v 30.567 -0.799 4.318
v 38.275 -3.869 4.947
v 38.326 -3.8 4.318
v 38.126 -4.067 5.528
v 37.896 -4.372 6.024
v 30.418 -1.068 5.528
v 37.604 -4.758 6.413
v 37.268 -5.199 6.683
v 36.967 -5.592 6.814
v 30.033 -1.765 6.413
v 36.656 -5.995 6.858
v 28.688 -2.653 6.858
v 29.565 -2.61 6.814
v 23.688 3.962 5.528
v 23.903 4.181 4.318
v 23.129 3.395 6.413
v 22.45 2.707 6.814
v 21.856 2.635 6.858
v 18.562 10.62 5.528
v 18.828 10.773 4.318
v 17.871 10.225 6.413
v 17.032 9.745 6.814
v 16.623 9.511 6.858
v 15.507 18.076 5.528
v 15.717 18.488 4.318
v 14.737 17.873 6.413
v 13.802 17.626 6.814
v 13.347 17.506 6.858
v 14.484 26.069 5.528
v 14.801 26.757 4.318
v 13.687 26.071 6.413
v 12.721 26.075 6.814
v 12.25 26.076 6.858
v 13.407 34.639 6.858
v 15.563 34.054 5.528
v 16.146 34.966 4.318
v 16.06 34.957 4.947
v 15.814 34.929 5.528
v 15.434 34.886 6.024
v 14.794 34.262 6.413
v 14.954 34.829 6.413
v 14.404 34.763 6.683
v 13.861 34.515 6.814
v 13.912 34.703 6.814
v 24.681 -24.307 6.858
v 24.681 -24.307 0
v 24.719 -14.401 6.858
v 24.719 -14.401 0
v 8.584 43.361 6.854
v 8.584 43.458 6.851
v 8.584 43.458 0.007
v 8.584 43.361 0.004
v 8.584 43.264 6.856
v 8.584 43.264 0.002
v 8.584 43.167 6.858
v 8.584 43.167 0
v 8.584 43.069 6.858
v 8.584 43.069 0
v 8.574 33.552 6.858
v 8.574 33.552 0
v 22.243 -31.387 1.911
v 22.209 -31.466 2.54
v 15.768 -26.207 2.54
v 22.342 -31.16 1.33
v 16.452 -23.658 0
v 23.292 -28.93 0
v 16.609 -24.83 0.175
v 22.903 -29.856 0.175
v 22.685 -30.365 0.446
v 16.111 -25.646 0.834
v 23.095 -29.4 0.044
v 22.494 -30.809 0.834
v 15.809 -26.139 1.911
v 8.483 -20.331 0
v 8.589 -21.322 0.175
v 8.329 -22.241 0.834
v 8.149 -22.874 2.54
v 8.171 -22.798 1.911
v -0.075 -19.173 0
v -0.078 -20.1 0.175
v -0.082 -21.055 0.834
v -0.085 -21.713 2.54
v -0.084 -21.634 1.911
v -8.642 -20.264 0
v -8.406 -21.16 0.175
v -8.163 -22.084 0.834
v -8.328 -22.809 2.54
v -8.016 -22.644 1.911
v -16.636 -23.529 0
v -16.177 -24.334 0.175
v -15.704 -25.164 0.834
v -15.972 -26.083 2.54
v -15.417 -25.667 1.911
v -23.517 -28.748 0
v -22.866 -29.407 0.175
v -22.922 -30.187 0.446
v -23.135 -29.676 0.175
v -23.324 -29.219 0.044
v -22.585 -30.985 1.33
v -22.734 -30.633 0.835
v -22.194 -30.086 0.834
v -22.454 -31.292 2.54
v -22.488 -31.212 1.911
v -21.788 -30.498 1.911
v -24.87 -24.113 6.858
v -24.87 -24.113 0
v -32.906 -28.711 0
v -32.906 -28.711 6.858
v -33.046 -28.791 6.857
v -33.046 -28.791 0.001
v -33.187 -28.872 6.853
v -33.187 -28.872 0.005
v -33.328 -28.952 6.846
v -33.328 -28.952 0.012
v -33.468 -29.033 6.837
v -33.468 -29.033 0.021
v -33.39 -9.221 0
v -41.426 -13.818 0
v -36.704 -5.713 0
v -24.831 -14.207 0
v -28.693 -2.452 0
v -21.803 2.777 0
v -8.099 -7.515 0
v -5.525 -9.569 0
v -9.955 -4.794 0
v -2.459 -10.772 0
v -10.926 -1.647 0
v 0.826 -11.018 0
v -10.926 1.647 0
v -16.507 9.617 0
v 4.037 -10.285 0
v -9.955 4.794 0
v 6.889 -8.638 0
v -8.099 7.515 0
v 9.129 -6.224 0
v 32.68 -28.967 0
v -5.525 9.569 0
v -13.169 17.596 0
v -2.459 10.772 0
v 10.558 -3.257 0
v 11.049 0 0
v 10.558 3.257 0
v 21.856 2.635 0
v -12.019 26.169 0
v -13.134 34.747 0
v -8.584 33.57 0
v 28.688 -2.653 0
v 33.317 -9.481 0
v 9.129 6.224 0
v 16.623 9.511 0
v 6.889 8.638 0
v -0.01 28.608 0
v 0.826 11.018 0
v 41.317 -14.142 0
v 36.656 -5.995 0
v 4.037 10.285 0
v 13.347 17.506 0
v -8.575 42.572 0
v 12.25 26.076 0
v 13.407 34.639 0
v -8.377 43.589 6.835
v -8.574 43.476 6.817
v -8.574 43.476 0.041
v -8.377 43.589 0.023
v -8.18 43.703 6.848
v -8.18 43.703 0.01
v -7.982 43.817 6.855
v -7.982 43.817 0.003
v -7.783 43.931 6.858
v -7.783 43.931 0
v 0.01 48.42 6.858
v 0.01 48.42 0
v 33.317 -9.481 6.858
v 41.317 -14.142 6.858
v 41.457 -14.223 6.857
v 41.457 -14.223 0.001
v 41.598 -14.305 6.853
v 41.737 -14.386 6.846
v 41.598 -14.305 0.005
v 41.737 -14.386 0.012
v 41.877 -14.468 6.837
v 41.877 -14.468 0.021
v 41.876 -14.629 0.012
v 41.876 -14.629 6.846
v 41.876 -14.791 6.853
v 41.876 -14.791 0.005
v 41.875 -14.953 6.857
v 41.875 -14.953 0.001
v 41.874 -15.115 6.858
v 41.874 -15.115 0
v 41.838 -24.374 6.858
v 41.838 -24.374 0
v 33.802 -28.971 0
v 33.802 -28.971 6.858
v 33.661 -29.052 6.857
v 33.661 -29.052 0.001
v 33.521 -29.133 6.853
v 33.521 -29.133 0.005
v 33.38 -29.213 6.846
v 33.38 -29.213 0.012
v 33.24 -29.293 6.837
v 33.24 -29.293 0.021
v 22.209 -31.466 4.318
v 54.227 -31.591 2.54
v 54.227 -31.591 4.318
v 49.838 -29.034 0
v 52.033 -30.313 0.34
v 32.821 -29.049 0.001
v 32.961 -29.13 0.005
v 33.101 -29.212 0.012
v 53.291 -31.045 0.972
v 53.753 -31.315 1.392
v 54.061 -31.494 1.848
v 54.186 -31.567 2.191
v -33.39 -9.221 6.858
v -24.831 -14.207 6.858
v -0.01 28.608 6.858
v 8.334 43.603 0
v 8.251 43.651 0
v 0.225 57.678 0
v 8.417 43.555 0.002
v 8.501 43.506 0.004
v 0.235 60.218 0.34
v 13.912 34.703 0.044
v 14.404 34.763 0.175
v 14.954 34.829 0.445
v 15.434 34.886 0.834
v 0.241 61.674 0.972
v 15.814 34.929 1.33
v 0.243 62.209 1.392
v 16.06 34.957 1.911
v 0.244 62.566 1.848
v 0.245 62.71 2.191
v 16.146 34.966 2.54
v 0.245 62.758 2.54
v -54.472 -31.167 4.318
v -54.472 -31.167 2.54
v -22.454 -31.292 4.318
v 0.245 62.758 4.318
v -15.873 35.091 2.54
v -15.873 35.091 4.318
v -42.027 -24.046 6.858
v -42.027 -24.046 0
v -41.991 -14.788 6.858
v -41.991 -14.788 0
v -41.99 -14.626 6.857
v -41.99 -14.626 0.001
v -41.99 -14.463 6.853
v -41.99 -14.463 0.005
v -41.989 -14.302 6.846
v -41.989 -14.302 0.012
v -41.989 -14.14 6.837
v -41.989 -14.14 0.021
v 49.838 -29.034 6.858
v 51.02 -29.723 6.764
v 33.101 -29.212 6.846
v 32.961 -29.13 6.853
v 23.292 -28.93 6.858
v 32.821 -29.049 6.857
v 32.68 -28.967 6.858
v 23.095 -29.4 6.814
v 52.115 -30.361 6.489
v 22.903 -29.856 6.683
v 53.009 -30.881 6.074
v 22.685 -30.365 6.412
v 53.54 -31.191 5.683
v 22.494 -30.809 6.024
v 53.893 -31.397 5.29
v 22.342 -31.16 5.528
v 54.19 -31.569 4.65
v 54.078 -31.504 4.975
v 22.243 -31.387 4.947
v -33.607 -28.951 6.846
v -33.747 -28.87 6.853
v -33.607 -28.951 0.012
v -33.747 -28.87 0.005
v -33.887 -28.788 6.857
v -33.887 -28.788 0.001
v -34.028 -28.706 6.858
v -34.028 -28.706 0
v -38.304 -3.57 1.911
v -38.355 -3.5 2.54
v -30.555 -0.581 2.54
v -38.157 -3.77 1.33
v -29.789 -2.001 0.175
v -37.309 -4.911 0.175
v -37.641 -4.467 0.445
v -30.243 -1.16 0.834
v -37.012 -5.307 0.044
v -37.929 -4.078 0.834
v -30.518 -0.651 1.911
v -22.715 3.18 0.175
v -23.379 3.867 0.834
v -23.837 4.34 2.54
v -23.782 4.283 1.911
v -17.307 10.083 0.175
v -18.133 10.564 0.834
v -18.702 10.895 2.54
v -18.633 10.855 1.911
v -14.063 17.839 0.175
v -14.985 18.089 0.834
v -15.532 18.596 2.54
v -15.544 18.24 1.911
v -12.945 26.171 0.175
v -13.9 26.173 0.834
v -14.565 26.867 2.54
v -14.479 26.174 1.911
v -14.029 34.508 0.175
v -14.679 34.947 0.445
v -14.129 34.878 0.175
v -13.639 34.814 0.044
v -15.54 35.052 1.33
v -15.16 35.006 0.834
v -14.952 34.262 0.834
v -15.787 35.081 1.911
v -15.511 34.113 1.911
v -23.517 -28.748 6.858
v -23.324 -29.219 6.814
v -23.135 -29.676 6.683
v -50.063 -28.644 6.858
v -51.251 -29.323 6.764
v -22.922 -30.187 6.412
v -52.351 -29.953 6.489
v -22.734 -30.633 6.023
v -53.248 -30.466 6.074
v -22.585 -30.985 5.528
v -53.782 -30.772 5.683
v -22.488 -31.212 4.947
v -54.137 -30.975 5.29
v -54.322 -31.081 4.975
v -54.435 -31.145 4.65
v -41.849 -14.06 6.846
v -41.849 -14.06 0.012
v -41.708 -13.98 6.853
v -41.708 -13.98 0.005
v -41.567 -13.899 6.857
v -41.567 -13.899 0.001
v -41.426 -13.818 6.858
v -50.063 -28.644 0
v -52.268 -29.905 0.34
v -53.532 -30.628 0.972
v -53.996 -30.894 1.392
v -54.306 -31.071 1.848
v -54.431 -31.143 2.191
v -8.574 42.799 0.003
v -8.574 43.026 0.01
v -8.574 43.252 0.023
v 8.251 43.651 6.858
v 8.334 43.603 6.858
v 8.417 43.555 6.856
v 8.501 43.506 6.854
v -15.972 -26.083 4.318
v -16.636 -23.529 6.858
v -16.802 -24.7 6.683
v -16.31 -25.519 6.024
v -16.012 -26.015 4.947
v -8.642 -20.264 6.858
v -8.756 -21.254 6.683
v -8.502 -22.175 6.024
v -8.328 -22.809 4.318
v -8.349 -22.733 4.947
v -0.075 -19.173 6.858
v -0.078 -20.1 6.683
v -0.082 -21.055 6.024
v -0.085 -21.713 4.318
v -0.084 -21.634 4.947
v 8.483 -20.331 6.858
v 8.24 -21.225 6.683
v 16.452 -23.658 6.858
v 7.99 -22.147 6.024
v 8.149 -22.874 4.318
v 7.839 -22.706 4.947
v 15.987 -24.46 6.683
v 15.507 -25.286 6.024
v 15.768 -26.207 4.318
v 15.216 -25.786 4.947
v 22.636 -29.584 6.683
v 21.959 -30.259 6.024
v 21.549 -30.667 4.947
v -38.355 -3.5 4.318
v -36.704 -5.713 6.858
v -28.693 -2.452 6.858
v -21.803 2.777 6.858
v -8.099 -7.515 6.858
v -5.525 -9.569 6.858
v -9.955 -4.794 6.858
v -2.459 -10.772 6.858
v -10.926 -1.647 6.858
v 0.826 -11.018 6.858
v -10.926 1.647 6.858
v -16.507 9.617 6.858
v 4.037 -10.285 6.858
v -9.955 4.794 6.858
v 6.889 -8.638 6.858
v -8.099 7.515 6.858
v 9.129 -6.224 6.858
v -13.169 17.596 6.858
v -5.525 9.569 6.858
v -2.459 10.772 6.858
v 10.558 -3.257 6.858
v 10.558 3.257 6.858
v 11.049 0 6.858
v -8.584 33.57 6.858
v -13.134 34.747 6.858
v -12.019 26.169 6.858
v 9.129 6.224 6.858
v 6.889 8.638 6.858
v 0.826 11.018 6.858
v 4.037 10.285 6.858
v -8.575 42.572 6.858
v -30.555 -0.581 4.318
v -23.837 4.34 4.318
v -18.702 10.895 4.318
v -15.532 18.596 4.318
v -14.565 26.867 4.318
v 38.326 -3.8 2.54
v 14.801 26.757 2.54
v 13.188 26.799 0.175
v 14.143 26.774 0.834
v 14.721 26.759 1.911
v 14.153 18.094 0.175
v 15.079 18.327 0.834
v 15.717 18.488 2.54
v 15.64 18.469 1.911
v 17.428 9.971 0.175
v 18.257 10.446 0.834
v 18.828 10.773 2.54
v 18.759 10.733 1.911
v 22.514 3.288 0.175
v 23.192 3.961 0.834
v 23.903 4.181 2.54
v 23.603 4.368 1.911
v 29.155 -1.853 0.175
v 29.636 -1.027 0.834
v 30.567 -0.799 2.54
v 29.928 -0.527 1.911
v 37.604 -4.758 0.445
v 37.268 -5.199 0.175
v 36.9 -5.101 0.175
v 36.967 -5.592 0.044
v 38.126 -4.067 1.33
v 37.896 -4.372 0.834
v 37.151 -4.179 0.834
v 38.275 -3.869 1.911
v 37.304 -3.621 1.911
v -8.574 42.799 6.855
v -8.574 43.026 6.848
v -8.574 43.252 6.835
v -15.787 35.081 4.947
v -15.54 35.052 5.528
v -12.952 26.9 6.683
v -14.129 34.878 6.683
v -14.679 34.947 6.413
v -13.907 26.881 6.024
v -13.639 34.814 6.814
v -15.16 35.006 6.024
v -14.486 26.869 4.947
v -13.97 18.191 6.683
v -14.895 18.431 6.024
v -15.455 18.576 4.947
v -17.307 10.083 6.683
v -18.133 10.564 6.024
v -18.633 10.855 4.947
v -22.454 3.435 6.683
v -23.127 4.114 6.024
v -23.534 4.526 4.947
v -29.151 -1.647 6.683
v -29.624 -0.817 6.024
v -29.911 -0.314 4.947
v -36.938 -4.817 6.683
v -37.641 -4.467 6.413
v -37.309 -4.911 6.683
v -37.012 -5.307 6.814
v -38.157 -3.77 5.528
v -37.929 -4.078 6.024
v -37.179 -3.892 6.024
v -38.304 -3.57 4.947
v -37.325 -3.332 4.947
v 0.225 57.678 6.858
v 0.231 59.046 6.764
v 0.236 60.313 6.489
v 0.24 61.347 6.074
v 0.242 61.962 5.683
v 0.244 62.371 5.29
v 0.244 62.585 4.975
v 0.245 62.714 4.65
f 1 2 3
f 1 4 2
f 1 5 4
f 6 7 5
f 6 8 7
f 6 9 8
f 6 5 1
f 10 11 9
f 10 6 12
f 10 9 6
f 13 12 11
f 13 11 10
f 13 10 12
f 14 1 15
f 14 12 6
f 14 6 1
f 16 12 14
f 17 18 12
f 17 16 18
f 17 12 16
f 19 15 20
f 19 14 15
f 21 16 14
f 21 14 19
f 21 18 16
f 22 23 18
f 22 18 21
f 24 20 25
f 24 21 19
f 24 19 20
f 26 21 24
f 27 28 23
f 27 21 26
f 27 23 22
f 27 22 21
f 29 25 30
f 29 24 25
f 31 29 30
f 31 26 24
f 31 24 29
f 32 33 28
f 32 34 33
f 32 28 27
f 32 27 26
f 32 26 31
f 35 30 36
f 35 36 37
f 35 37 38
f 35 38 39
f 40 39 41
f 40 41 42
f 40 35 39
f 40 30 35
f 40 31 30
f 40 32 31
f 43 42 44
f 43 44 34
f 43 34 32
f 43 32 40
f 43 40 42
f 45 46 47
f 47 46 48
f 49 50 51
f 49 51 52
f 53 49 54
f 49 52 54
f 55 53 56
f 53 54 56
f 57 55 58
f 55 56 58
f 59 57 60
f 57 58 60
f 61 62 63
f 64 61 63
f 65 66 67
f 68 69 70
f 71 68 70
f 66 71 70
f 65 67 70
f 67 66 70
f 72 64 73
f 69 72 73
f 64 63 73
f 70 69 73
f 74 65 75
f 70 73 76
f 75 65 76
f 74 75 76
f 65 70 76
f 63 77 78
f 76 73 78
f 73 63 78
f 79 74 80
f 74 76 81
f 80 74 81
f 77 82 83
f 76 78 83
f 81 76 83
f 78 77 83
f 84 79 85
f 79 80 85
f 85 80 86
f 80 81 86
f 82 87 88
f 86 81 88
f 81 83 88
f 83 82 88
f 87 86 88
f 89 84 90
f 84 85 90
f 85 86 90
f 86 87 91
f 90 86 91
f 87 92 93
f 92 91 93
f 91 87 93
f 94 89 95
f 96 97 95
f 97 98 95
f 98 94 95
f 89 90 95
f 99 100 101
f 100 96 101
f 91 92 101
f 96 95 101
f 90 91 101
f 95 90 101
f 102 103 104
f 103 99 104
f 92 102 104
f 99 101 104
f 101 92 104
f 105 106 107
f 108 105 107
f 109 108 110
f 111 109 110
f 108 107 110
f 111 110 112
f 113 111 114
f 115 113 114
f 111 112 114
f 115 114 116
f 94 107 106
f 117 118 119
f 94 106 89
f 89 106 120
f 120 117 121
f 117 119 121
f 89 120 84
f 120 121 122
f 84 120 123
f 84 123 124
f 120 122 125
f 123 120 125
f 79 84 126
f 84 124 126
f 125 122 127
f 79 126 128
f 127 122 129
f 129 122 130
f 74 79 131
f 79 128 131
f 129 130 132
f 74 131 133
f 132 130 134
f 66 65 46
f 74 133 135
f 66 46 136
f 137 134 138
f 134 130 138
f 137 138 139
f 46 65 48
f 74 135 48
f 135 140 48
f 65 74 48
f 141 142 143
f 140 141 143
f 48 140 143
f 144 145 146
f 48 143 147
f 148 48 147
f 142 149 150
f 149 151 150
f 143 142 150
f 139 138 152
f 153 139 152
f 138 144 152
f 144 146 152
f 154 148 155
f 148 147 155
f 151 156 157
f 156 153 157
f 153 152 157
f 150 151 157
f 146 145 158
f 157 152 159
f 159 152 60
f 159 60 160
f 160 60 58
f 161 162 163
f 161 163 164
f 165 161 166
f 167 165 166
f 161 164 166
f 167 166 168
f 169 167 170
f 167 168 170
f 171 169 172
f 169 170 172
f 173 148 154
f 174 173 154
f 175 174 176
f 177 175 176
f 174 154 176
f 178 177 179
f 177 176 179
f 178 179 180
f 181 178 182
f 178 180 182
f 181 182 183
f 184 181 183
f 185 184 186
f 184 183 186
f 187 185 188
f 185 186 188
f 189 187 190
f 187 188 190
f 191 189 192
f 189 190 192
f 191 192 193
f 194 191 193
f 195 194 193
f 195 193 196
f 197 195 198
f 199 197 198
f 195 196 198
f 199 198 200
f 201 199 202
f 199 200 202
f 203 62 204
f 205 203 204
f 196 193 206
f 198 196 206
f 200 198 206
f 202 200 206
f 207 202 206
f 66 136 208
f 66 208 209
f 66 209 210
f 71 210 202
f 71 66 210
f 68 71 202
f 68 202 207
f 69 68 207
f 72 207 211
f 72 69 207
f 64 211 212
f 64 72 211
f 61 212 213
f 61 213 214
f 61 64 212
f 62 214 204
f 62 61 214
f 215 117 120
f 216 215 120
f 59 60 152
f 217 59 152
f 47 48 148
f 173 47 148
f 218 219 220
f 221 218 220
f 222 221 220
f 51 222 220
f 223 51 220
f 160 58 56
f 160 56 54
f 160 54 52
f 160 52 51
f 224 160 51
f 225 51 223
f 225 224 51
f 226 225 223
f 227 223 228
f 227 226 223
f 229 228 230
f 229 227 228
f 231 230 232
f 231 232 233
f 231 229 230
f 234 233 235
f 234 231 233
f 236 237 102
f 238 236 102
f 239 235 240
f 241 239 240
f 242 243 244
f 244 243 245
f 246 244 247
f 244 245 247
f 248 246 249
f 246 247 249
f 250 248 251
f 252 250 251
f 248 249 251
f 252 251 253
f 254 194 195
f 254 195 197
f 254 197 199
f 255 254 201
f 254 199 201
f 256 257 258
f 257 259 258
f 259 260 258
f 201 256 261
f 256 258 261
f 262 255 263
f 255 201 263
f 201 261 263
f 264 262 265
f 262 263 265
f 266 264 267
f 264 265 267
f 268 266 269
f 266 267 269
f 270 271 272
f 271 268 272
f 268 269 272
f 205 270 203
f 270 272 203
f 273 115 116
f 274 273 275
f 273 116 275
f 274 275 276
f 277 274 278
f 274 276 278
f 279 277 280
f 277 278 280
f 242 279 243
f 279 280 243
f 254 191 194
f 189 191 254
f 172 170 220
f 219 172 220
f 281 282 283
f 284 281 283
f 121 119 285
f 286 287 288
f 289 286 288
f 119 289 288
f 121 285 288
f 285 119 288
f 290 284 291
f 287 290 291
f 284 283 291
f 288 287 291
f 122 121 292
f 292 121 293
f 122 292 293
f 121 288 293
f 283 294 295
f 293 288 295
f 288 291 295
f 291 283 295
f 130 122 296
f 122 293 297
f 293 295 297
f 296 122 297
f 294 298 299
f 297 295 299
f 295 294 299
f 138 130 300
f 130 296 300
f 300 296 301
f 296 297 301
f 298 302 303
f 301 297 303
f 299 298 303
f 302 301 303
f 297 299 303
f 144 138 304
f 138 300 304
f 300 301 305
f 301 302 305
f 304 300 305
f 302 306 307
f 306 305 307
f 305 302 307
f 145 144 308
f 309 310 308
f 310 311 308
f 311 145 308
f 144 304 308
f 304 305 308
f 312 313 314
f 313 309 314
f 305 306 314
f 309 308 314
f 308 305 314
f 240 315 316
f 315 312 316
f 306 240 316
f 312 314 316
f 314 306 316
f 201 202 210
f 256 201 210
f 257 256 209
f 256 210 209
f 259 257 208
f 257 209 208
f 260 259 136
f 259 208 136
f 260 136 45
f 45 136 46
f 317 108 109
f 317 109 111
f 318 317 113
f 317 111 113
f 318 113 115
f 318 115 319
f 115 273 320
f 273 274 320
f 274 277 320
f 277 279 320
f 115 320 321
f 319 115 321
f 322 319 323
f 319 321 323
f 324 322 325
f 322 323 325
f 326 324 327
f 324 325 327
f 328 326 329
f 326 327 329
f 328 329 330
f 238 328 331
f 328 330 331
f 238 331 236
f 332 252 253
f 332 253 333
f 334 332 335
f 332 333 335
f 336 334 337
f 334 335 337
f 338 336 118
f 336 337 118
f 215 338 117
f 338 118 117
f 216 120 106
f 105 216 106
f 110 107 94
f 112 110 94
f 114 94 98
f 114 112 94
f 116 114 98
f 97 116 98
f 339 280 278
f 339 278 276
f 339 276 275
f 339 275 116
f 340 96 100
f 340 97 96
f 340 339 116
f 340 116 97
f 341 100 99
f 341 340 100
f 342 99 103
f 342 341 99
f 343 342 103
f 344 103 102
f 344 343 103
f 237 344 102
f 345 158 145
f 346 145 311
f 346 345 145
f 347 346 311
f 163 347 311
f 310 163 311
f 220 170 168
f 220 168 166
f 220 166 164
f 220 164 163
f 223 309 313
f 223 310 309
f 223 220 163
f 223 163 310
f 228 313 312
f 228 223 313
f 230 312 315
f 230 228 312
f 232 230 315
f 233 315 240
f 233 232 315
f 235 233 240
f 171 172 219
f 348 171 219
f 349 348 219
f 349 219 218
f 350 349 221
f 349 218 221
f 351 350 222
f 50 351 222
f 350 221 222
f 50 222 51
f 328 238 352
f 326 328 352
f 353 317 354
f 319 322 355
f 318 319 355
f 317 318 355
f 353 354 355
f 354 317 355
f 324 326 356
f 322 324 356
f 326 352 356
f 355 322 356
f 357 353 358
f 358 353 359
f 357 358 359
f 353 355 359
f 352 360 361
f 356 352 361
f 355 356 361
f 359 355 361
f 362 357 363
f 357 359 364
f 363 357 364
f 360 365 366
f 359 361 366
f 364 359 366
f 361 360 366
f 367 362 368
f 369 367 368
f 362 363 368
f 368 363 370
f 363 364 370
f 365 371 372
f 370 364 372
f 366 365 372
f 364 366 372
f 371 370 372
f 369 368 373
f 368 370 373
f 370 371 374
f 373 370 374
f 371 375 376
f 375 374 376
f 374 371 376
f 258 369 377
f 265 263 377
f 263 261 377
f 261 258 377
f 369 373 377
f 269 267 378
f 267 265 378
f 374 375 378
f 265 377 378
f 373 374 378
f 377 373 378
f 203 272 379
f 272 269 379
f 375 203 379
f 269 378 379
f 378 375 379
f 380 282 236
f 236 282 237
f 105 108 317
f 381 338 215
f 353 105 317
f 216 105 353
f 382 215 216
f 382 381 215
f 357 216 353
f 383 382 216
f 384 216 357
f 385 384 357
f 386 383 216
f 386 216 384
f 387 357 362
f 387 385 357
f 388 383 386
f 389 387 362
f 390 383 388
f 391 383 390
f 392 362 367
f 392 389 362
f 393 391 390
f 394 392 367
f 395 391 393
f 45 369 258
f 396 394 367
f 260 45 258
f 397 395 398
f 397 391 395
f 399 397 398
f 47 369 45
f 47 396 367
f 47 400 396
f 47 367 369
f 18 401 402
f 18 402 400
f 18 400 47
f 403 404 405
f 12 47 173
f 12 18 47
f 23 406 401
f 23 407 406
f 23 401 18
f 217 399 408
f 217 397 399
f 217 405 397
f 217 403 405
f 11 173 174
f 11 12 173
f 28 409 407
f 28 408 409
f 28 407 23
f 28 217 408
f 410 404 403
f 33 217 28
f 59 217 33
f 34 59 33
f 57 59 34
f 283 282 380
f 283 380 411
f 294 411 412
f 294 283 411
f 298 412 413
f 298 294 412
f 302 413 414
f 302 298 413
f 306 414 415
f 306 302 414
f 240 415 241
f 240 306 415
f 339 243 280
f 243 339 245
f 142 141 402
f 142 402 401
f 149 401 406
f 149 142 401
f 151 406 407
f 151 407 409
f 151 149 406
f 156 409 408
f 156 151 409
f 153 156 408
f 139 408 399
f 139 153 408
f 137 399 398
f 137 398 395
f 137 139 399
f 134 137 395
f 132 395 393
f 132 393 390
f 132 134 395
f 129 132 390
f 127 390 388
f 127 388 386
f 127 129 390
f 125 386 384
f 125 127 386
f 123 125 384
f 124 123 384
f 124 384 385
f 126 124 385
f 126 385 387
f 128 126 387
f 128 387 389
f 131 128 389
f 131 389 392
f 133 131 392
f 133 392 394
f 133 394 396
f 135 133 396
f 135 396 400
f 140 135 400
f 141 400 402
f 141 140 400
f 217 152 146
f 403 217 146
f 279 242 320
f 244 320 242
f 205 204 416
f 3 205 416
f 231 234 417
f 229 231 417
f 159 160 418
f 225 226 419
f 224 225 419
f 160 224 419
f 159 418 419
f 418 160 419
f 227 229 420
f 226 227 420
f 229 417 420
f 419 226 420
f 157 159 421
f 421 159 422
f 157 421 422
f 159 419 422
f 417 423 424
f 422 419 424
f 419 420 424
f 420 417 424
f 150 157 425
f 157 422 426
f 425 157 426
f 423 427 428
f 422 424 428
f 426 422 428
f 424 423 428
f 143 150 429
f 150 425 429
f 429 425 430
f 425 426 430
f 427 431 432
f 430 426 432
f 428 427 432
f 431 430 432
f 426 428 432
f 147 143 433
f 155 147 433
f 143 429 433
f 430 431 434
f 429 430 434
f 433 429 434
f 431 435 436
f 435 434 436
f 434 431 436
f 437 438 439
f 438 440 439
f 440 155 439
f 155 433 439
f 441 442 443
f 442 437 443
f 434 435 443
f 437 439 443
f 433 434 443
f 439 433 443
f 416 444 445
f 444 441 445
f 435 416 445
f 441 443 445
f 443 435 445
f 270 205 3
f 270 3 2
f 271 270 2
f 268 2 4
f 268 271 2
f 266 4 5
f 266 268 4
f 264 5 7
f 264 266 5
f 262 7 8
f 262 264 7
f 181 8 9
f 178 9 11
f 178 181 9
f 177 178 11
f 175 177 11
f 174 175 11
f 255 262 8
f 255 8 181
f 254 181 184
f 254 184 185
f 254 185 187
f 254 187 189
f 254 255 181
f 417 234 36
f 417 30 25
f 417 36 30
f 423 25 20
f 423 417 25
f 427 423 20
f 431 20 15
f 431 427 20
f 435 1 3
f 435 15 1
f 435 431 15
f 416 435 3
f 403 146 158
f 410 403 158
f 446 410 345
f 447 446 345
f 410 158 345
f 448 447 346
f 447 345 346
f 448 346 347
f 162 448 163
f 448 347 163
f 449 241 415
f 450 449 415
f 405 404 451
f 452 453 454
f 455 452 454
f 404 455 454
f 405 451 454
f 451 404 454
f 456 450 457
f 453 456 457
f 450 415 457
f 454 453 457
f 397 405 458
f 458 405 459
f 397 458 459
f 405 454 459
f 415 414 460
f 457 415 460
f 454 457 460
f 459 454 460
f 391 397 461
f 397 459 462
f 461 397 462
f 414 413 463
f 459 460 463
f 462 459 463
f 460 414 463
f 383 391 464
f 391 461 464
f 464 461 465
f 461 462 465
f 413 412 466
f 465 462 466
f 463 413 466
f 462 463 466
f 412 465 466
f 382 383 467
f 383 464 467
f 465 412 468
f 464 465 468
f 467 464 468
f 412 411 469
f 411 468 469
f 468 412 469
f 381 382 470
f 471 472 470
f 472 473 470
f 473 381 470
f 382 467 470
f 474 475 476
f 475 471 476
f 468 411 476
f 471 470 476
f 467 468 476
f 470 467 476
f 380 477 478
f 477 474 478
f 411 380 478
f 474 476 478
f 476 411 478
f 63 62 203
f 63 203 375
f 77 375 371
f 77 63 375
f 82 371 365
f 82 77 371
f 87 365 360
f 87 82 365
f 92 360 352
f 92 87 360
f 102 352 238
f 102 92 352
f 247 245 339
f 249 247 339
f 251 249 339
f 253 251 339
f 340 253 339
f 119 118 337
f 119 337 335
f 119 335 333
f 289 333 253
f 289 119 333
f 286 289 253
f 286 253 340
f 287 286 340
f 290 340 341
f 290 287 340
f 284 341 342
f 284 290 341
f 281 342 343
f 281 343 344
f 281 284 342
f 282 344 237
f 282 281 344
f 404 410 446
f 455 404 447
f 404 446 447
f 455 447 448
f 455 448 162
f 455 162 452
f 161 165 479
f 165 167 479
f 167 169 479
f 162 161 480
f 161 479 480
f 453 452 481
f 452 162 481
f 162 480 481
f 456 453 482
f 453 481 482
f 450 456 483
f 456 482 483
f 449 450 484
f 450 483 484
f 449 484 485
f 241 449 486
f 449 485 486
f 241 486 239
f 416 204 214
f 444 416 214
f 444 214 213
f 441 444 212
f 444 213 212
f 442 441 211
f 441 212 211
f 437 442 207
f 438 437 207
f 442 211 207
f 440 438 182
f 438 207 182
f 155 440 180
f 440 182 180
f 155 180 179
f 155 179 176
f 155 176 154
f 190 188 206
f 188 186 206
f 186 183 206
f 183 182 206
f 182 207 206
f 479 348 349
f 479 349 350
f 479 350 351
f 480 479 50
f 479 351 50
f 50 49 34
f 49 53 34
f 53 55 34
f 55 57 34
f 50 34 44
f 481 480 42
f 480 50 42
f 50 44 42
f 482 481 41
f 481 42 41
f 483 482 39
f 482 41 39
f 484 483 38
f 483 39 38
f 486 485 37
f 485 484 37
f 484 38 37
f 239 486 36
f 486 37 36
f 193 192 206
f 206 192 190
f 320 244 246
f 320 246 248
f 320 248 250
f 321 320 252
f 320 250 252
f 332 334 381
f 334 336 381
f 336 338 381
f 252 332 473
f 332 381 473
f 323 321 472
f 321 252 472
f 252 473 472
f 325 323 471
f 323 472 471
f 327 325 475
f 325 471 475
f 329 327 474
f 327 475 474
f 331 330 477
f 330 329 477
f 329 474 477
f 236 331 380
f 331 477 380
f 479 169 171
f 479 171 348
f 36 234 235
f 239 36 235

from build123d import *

# Parameters (mm, degrees)
F0_R         = 11.049
F1_DEPTH     = 6.858
F2_DEPTH     = 46.99
F3_DEPTH     = 37.592
F4_DEPTH     = 42.418
F5_DEPTH     = 29.718
F6_DEPTH     = 25.4
F7_T1_DEPTH  = 44.7190403061
F7_T3_DEPTH  = 44.7190403061
F7_T5_DEPTH  = 44.7190403061
F7_T7_DEPTH  = 44.7190403061
F7_T9_DEPTH  = 44.7190403061
F7_T11_DEPTH = 44.7190403061
F7_T14_ANGLE = 117.6067451319
F7_T16_ANGLE = 117.3898443425
F7_T18_ANGLE = 118.1021999746
F7_T20_ANGLE = 118.1021999746
F7_T22_ANGLE = 117.3898443425
F7_T24_ANGLE = 117.6067451319


# Not quite as in the source:
# - a fillet or chamfer that OpenCascade refuses, or shapes differently, is made with other operations: its cross-section is extruded or revolved along the edge and cut away or added


with BuildPart() as f1:
    # F0 (on Top) → F1 (new body)
    with BuildSketch(Plane.XY):
        with BuildLine():
            Line((22.208523276, -31.466120161), (54.2273194105, -31.5911650137))
            Line((54.2273194105, -31.5911650137), (38.3262133623, -3.7995517362))
            ThreePointArc((38.3262133623, -3.7995517362), (18.8280371905, 10.7725526064), (16.14619778, 34.966205418))
            Line((16.14619778, 34.966205418), (0.2450917317, 62.7578186955))
            Line((0.2450917317, 62.7578186955), (-15.8725983546, 35.0912502707))
            ThreePointArc((-15.8725983546, 35.0912502707), (-18.7017871859, 10.8950848293), (-38.354721056, -3.500085257))
            Line((-38.354721056, -3.500085257), (-54.4724111423, -31.1666536818))
            Line((-54.4724111423, -31.1666536818), (-22.4536150077, -31.2916985345))
            ThreePointArc((-22.4536150077, -31.2916985345), (-0.0847964289, -21.7128455258), (22.208523276, -31.466120161))
        make_face()
        Polygon((-41.9885712831, -14.1401743102), (-33.3904459647, -9.2207152943), (-24.8310068248, -14.207180737), (-24.8696930034, -24.1131051956), (-33.4678183218, -29.0325642115), (-42.0272574616, -24.0460987688), align=None, mode=Mode.SUBTRACT)
        Polygon((24.6805966683, -24.3066168019), (24.7192828468, -14.4006923433), (33.3174081652, -9.4812333274), (41.8768473051, -14.4676987701), (41.8381611265, -24.3736232287), (33.2400358081, -29.2930822446), align=None, mode=Mode.SUBTRACT)
        Circle(F0_R, mode=Mode.SUBTRACT)
        Polygon((-8.5839493951, 33.5699382512), (-8.5737367865, 43.4759329869), (0.0102126086, 48.4200859762), (8.5839493951, 43.4582442299), (8.5737367865, 33.5522494943), (-0.0102126086, 28.6080965049), align=None, mode=Mode.SUBTRACT)
        with BuildLine():
            Line((-22.4536150077, -31.2916985345), (22.208523276, -31.466120161))
            ThreePointArc((22.208523276, -31.466120161), (-0.0847964289, -21.7128455258), (-22.4536150077, -31.2916985345))
        make_face()
        with BuildLine():
            ThreePointArc((16.14619778, 34.966205418), (18.8280371905, 10.7725526064), (38.3262133623, -3.7995517362))
            Line((38.3262133623, -3.7995517362), (16.14619778, 34.966205418))
        make_face()
        with BuildLine():
            Line((-15.8725983546, 35.0912502707), (-38.354721056, -3.500085257))
            ThreePointArc((-38.354721056, -3.500085257), (-18.7017871859, 10.8950848293), (-15.8725983546, 35.0912502707))
        make_face()
    extrude(amount=F1_DEPTH)

    # F0 (on Top) → F2 (cut)
    with BuildSketch(Plane.XY):
        with BuildLine():
            Line((-15.8725983546, 35.0912502707), (-38.354721056, -3.500085257))
            ThreePointArc((-38.354721056, -3.500085257), (-18.7017871859, 10.8950848293), (-15.8725983546, 35.0912502707))
        make_face()
    extrude(amount=F2_DEPTH, mode=Mode.SUBTRACT)

    # F0 (on Top) → F3 (cut)
    with BuildSketch(Plane.XY):
        with BuildLine():
            Line((-22.4536150077, -31.2916985345), (22.208523276, -31.466120161))
            ThreePointArc((22.208523276, -31.466120161), (-0.0847964289, -21.7128455258), (-22.4536150077, -31.2916985345))
        make_face()
    extrude(amount=F3_DEPTH, mode=Mode.SUBTRACT)

    # F0 (on Top) → F4 (cut)
    with BuildSketch(Plane.XY):
        with BuildLine():
            ThreePointArc((16.14619778, 34.966205418), (18.8280371905, 10.7725526064), (38.3262133623, -3.7995517362))
            Line((38.3262133623, -3.7995517362), (16.14619778, 34.966205418))
        make_face()
    extrude(amount=F4_DEPTH, mode=Mode.SUBTRACT)

    # F0 (on Top) → F5 (cut)
    with BuildSketch(Plane.XY):
        Circle(F0_R)
    extrude(amount=F5_DEPTH, mode=Mode.SUBTRACT)

    # F0 (on Top) → F6 (cut)
    with BuildSketch(Plane.XY):
        Circle(F0_R)
    extrude(amount=F6_DEPTH, mode=Mode.SUBTRACT)

    # F7: fillet of radius 2.54 on 18 edges, made by hand

    # F7_s2 → F7_t1 (cut)
    with BuildSketch(Plane(origin=(-7.936508422, 13.8712597833, 0), x_dir=(0, 0, 1), z_dir=(-0.4966140739, 0.8679714636, 0))):
        with BuildLine():
            ThreePointArc((0, 28.8391486396), (0.7439487758, 30.6351998638), (2.54, 31.3791486396))
            Line((2.54, 31.3791486396), (0, 31.3791486396))
            Line((0, 31.3791486396), (0, 28.8391486396))
        make_face()
        with BuildLine():
            ThreePointArc((6.858, 28.8391486396), (6.1140512242, 30.6351998638), (4.318, 31.3791486396))
            Line((4.318, 31.3791486396), (6.858, 31.3791486396))
            Line((6.858, 31.3791486396), (6.858, 28.8391486396))
        make_face()
    extrude(amount=F7_T1_DEPTH, mode=Mode.SUBTRACT)

    # F7_s4 → F7_t3 (cut)
    with BuildSketch(Plane(origin=(30.1446132086, -52.6861106484, 0), x_dir=(0, 0, 1), z_dir=(-0.4966140739, 0.8679714636, 0))):
        with BuildLine():
            ThreePointArc((2.54, 31.3791486396), (0.7439487758, 30.6351998638), (0, 28.8391486396))
            Line((0, 28.8391486396), (0, 31.3791486396))
            Line((0, 31.3791486396), (2.54, 31.3791486396))
        make_face()
        with BuildLine():
            ThreePointArc((4.318, 31.3791486396), (6.1140512242, 30.6351998638), (6.858, 28.8391486396))
            Line((6.858, 28.8391486396), (6.858, 31.3791486396))
            Line((6.858, 31.3791486396), (4.318, 31.3791486396))
        make_face()
    extrude(amount=F7_T3_DEPTH, mode=Mode.SUBTRACT)

    # F7_s6 → F7_t5 (cut)
    with BuildSketch(Plane(origin=(15.9811175658, -0.0624119809, 0), x_dir=(0, 0, 1), z_dir=(0.9999923742, -0.0039053279, 0))):
        with BuildLine():
            ThreePointArc((0, 28.8391486396), (0.7439487758, 30.6351998638), (2.54, 31.3791486396))
            Line((2.54, 31.3791486396), (0, 31.3791486396))
            Line((0, 31.3791486396), (0, 28.8391486396))
        make_face()
        with BuildLine():
            ThreePointArc((6.858, 28.8391486396), (6.1140512242, 30.6351998638), (4.318, 31.3791486396))
            Line((4.318, 31.3791486396), (6.858, 31.3791486396))
            Line((6.858, 31.3791486396), (6.858, 28.8391486396))
        make_face()
    extrude(amount=F7_T5_DEPTH, mode=Mode.SUBTRACT)

    # F7_s8 → F7_t7 (cut)
    with BuildSketch(Plane(origin=(-8.0446091438, -13.8088478024, 0), x_dir=(0, 0, 1), z_dir=(-0.5033783003, -0.8640661357, 0))):
        with BuildLine():
            ThreePointArc((0, 28.8391486396), (0.7439487758, 30.6351998638), (2.54, 31.3791486396))
            Line((2.54, 31.3791486396), (0, 31.3791486396))
            Line((0, 31.3791486396), (0, 28.8391486396))
        make_face()
        with BuildLine():
            ThreePointArc((6.858, 28.8391486396), (6.1140512242, 30.6351998638), (4.318, 31.3791486396))
            Line((4.318, 31.3791486396), (6.858, 31.3791486396))
            Line((6.858, 31.3791486396), (6.858, 28.8391486396))
        make_face()
    extrude(amount=F7_T7_DEPTH, mode=Mode.SUBTRACT)

    # F7_s10 → F7_t9 (cut)
    with BuildSketch(Plane(origin=(-60.6998168524, 0.2370544983, 0), x_dir=(0, 0, 1), z_dir=(0.9999923742, -0.0039053279, 0))):
        with BuildLine():
            ThreePointArc((0, 28.8391486396), (0.7439487758, 30.6351998638), (2.54, 31.3791486396))
            Line((2.54, 31.3791486396), (0, 31.3791486396))
            Line((0, 31.3791486396), (0, 28.8391486396))
        make_face()
        with BuildLine():
            ThreePointArc((6.858, 28.8391486396), (6.1140512242, 30.6351998638), (4.318, 31.3791486396))
            Line((4.318, 31.3791486396), (6.858, 31.3791486396))
            Line((6.858, 31.3791486396), (6.858, 28.8391486396))
        make_face()
    extrude(amount=F7_T9_DEPTH, mode=Mode.SUBTRACT)

    # F7_s12 → F7_t11 (cut)
    with BuildSketch(Plane(origin=(30.5552036438, 52.4490561501, 0), x_dir=(0, 0, 1), z_dir=(-0.5033783003, -0.8640661357, 0))):
        with BuildLine():
            ThreePointArc((0, 28.8391486396), (0.7439487758, 30.6351998638), (2.54, 31.3791486396))
            Line((2.54, 31.3791486396), (0, 31.3791486396))
            Line((0, 31.3791486396), (0, 28.8391486396))
        make_face()
        with BuildLine():
            ThreePointArc((6.858, 28.8391486396), (6.1140512242, 30.6351998638), (4.318, 31.3791486396))
            Line((4.318, 31.3791486396), (6.858, 31.3791486396))
            Line((6.858, 31.3791486396), (6.858, 28.8391486396))
        make_face()
    extrude(amount=F7_T11_DEPTH, mode=Mode.SUBTRACT)

    # F7_s13 → F7_t14 (revolve, cut)
    with BuildSketch(Plane(origin=(21.6971694487, 39.0990533159, 0), x_dir=(0, 0, 1), z_dir=(0.4852237348, 0.8743900315, 0))):
        with BuildLine():
            ThreePointArc((0, -6.0457943644), (0.7439487758, -4.2497431402), (2.54, -3.5057943644))
            Line((2.54, -3.5057943644), (0, -3.5057943644))
            Line((0, -3.5057943644), (0, -6.0457943644))
        make_face()
    revolve(axis=Axis((45.3732523459, 25.9605259365, 0), (0, 0, 1)), revolution_arc=F7_T14_ANGLE, mode=Mode.SUBTRACT)

    # F7_s15 → F7_t16 (revolve, cut)
    with BuildSketch(Plane(origin=(23.0875297384, -38.3008650951, 0), x_dir=(0, 0, 1), z_dir=(0.5162541117, -0.8564354571, 0))):
        with BuildLine():
            ThreePointArc((0, -5.9721181992), (0.7439487758, -4.176066975), (2.54, -3.4321181992))
            Line((2.54, -3.4321181992), (0, -3.4321181992))
            Line((0, -3.4321181992), (0, -5.9721181992))
        make_face()
    revolve(axis=Axis((-0.2044107419, -52.3411058879, 0), (0, 0, 1)), revolution_arc=F7_T16_ANGLE, mode=Mode.SUBTRACT)

    # F7_s17 → F7_t18 (revolve, cut)
    with BuildSketch(Plane(origin=(-44.6992655412, -0.5657482073, 0), x_dir=(0, 0, 1), z_dir=(-0.9999199127, -0.0126557538, 0))):
        with BuildLine():
            ThreePointArc((0, -6.2140449518), (0.7439487758, -4.4179937276), (2.54, -3.6740449518))
            Line((2.54, -3.6740449518), (0, -3.6740449518))
            Line((0, -3.6740449518), (0, -6.2140449518))
        make_face()
    revolve(axis=Axis((-45.0385149903, 26.2380507555, 0), (0, 0, 1)), revolution_arc=F7_T18_ANGLE, mode=Mode.SUBTRACT)

    # F7_s19 → F7_t20 (revolve, cut)
    with BuildSketch(Plane(origin=(-21.5544505992, 39.1631213047, 0), x_dir=(0, 0, 1), z_dir=(-0.4821717785, 0.8760766953, 0))):
        with BuildLine():
            ThreePointArc((6.858, 6.2140449518), (6.1140512242, 4.4179937276), (4.318, 3.6740449518))
            Line((4.318, 3.6740449518), (6.858, 3.6740449518))
            Line((6.858, 3.6740449518), (6.858, 6.2140449518))
        make_face()
    revolve(axis=Axis((-45.0385149903, 26.2380507555, 6.858), (0, 0, -1)), revolution_arc=F7_T20_ANGLE, mode=Mode.SUBTRACT)

    # F7_s21 → F7_t22 (revolve, cut)
    with BuildSketch(Plane(origin=(-23.3859780913, -38.1193694225, 0), x_dir=(0, 0, 1), z_dir=(-0.5229276359, -0.8523770807, 0))):
        with BuildLine():
            ThreePointArc((6.858, 5.9721181992), (6.1140512242, 4.176066975), (4.318, 3.4321181992))
            Line((4.318, 3.4321181992), (6.858, 3.4321181992))
            Line((6.858, 3.4321181992), (6.858, 5.9721181992))
        make_face()
    revolve(axis=Axis((-0.2044107419, -52.3411058879, 6.858), (0, 0, -1)), revolution_arc=F7_T22_ANGLE, mode=Mode.SUBTRACT)

    # F7_s23 → F7_t24 (revolve, cut)
    with BuildSketch(Plane(origin=(44.7020643692, -1.1084103144, 0), x_dir=(0, 0, 1), z_dir=(0.9996927331, -0.0247878874, 0))):
        with BuildLine():
            ThreePointArc((4.318, 3.5057943644), (6.1140512242, 4.2497431402), (6.858, 6.0457943644))
            Line((6.858, 6.0457943644), (6.858, 3.5057943644))
            Line((6.858, 3.5057943644), (4.318, 3.5057943644))
        make_face()
    revolve(axis=Axis((45.3732523459, 25.9605259365, 6.858), (0, 0, -1)), revolution_arc=F7_T24_ANGLE, mode=Mode.SUBTRACT)


solid = f1.part
